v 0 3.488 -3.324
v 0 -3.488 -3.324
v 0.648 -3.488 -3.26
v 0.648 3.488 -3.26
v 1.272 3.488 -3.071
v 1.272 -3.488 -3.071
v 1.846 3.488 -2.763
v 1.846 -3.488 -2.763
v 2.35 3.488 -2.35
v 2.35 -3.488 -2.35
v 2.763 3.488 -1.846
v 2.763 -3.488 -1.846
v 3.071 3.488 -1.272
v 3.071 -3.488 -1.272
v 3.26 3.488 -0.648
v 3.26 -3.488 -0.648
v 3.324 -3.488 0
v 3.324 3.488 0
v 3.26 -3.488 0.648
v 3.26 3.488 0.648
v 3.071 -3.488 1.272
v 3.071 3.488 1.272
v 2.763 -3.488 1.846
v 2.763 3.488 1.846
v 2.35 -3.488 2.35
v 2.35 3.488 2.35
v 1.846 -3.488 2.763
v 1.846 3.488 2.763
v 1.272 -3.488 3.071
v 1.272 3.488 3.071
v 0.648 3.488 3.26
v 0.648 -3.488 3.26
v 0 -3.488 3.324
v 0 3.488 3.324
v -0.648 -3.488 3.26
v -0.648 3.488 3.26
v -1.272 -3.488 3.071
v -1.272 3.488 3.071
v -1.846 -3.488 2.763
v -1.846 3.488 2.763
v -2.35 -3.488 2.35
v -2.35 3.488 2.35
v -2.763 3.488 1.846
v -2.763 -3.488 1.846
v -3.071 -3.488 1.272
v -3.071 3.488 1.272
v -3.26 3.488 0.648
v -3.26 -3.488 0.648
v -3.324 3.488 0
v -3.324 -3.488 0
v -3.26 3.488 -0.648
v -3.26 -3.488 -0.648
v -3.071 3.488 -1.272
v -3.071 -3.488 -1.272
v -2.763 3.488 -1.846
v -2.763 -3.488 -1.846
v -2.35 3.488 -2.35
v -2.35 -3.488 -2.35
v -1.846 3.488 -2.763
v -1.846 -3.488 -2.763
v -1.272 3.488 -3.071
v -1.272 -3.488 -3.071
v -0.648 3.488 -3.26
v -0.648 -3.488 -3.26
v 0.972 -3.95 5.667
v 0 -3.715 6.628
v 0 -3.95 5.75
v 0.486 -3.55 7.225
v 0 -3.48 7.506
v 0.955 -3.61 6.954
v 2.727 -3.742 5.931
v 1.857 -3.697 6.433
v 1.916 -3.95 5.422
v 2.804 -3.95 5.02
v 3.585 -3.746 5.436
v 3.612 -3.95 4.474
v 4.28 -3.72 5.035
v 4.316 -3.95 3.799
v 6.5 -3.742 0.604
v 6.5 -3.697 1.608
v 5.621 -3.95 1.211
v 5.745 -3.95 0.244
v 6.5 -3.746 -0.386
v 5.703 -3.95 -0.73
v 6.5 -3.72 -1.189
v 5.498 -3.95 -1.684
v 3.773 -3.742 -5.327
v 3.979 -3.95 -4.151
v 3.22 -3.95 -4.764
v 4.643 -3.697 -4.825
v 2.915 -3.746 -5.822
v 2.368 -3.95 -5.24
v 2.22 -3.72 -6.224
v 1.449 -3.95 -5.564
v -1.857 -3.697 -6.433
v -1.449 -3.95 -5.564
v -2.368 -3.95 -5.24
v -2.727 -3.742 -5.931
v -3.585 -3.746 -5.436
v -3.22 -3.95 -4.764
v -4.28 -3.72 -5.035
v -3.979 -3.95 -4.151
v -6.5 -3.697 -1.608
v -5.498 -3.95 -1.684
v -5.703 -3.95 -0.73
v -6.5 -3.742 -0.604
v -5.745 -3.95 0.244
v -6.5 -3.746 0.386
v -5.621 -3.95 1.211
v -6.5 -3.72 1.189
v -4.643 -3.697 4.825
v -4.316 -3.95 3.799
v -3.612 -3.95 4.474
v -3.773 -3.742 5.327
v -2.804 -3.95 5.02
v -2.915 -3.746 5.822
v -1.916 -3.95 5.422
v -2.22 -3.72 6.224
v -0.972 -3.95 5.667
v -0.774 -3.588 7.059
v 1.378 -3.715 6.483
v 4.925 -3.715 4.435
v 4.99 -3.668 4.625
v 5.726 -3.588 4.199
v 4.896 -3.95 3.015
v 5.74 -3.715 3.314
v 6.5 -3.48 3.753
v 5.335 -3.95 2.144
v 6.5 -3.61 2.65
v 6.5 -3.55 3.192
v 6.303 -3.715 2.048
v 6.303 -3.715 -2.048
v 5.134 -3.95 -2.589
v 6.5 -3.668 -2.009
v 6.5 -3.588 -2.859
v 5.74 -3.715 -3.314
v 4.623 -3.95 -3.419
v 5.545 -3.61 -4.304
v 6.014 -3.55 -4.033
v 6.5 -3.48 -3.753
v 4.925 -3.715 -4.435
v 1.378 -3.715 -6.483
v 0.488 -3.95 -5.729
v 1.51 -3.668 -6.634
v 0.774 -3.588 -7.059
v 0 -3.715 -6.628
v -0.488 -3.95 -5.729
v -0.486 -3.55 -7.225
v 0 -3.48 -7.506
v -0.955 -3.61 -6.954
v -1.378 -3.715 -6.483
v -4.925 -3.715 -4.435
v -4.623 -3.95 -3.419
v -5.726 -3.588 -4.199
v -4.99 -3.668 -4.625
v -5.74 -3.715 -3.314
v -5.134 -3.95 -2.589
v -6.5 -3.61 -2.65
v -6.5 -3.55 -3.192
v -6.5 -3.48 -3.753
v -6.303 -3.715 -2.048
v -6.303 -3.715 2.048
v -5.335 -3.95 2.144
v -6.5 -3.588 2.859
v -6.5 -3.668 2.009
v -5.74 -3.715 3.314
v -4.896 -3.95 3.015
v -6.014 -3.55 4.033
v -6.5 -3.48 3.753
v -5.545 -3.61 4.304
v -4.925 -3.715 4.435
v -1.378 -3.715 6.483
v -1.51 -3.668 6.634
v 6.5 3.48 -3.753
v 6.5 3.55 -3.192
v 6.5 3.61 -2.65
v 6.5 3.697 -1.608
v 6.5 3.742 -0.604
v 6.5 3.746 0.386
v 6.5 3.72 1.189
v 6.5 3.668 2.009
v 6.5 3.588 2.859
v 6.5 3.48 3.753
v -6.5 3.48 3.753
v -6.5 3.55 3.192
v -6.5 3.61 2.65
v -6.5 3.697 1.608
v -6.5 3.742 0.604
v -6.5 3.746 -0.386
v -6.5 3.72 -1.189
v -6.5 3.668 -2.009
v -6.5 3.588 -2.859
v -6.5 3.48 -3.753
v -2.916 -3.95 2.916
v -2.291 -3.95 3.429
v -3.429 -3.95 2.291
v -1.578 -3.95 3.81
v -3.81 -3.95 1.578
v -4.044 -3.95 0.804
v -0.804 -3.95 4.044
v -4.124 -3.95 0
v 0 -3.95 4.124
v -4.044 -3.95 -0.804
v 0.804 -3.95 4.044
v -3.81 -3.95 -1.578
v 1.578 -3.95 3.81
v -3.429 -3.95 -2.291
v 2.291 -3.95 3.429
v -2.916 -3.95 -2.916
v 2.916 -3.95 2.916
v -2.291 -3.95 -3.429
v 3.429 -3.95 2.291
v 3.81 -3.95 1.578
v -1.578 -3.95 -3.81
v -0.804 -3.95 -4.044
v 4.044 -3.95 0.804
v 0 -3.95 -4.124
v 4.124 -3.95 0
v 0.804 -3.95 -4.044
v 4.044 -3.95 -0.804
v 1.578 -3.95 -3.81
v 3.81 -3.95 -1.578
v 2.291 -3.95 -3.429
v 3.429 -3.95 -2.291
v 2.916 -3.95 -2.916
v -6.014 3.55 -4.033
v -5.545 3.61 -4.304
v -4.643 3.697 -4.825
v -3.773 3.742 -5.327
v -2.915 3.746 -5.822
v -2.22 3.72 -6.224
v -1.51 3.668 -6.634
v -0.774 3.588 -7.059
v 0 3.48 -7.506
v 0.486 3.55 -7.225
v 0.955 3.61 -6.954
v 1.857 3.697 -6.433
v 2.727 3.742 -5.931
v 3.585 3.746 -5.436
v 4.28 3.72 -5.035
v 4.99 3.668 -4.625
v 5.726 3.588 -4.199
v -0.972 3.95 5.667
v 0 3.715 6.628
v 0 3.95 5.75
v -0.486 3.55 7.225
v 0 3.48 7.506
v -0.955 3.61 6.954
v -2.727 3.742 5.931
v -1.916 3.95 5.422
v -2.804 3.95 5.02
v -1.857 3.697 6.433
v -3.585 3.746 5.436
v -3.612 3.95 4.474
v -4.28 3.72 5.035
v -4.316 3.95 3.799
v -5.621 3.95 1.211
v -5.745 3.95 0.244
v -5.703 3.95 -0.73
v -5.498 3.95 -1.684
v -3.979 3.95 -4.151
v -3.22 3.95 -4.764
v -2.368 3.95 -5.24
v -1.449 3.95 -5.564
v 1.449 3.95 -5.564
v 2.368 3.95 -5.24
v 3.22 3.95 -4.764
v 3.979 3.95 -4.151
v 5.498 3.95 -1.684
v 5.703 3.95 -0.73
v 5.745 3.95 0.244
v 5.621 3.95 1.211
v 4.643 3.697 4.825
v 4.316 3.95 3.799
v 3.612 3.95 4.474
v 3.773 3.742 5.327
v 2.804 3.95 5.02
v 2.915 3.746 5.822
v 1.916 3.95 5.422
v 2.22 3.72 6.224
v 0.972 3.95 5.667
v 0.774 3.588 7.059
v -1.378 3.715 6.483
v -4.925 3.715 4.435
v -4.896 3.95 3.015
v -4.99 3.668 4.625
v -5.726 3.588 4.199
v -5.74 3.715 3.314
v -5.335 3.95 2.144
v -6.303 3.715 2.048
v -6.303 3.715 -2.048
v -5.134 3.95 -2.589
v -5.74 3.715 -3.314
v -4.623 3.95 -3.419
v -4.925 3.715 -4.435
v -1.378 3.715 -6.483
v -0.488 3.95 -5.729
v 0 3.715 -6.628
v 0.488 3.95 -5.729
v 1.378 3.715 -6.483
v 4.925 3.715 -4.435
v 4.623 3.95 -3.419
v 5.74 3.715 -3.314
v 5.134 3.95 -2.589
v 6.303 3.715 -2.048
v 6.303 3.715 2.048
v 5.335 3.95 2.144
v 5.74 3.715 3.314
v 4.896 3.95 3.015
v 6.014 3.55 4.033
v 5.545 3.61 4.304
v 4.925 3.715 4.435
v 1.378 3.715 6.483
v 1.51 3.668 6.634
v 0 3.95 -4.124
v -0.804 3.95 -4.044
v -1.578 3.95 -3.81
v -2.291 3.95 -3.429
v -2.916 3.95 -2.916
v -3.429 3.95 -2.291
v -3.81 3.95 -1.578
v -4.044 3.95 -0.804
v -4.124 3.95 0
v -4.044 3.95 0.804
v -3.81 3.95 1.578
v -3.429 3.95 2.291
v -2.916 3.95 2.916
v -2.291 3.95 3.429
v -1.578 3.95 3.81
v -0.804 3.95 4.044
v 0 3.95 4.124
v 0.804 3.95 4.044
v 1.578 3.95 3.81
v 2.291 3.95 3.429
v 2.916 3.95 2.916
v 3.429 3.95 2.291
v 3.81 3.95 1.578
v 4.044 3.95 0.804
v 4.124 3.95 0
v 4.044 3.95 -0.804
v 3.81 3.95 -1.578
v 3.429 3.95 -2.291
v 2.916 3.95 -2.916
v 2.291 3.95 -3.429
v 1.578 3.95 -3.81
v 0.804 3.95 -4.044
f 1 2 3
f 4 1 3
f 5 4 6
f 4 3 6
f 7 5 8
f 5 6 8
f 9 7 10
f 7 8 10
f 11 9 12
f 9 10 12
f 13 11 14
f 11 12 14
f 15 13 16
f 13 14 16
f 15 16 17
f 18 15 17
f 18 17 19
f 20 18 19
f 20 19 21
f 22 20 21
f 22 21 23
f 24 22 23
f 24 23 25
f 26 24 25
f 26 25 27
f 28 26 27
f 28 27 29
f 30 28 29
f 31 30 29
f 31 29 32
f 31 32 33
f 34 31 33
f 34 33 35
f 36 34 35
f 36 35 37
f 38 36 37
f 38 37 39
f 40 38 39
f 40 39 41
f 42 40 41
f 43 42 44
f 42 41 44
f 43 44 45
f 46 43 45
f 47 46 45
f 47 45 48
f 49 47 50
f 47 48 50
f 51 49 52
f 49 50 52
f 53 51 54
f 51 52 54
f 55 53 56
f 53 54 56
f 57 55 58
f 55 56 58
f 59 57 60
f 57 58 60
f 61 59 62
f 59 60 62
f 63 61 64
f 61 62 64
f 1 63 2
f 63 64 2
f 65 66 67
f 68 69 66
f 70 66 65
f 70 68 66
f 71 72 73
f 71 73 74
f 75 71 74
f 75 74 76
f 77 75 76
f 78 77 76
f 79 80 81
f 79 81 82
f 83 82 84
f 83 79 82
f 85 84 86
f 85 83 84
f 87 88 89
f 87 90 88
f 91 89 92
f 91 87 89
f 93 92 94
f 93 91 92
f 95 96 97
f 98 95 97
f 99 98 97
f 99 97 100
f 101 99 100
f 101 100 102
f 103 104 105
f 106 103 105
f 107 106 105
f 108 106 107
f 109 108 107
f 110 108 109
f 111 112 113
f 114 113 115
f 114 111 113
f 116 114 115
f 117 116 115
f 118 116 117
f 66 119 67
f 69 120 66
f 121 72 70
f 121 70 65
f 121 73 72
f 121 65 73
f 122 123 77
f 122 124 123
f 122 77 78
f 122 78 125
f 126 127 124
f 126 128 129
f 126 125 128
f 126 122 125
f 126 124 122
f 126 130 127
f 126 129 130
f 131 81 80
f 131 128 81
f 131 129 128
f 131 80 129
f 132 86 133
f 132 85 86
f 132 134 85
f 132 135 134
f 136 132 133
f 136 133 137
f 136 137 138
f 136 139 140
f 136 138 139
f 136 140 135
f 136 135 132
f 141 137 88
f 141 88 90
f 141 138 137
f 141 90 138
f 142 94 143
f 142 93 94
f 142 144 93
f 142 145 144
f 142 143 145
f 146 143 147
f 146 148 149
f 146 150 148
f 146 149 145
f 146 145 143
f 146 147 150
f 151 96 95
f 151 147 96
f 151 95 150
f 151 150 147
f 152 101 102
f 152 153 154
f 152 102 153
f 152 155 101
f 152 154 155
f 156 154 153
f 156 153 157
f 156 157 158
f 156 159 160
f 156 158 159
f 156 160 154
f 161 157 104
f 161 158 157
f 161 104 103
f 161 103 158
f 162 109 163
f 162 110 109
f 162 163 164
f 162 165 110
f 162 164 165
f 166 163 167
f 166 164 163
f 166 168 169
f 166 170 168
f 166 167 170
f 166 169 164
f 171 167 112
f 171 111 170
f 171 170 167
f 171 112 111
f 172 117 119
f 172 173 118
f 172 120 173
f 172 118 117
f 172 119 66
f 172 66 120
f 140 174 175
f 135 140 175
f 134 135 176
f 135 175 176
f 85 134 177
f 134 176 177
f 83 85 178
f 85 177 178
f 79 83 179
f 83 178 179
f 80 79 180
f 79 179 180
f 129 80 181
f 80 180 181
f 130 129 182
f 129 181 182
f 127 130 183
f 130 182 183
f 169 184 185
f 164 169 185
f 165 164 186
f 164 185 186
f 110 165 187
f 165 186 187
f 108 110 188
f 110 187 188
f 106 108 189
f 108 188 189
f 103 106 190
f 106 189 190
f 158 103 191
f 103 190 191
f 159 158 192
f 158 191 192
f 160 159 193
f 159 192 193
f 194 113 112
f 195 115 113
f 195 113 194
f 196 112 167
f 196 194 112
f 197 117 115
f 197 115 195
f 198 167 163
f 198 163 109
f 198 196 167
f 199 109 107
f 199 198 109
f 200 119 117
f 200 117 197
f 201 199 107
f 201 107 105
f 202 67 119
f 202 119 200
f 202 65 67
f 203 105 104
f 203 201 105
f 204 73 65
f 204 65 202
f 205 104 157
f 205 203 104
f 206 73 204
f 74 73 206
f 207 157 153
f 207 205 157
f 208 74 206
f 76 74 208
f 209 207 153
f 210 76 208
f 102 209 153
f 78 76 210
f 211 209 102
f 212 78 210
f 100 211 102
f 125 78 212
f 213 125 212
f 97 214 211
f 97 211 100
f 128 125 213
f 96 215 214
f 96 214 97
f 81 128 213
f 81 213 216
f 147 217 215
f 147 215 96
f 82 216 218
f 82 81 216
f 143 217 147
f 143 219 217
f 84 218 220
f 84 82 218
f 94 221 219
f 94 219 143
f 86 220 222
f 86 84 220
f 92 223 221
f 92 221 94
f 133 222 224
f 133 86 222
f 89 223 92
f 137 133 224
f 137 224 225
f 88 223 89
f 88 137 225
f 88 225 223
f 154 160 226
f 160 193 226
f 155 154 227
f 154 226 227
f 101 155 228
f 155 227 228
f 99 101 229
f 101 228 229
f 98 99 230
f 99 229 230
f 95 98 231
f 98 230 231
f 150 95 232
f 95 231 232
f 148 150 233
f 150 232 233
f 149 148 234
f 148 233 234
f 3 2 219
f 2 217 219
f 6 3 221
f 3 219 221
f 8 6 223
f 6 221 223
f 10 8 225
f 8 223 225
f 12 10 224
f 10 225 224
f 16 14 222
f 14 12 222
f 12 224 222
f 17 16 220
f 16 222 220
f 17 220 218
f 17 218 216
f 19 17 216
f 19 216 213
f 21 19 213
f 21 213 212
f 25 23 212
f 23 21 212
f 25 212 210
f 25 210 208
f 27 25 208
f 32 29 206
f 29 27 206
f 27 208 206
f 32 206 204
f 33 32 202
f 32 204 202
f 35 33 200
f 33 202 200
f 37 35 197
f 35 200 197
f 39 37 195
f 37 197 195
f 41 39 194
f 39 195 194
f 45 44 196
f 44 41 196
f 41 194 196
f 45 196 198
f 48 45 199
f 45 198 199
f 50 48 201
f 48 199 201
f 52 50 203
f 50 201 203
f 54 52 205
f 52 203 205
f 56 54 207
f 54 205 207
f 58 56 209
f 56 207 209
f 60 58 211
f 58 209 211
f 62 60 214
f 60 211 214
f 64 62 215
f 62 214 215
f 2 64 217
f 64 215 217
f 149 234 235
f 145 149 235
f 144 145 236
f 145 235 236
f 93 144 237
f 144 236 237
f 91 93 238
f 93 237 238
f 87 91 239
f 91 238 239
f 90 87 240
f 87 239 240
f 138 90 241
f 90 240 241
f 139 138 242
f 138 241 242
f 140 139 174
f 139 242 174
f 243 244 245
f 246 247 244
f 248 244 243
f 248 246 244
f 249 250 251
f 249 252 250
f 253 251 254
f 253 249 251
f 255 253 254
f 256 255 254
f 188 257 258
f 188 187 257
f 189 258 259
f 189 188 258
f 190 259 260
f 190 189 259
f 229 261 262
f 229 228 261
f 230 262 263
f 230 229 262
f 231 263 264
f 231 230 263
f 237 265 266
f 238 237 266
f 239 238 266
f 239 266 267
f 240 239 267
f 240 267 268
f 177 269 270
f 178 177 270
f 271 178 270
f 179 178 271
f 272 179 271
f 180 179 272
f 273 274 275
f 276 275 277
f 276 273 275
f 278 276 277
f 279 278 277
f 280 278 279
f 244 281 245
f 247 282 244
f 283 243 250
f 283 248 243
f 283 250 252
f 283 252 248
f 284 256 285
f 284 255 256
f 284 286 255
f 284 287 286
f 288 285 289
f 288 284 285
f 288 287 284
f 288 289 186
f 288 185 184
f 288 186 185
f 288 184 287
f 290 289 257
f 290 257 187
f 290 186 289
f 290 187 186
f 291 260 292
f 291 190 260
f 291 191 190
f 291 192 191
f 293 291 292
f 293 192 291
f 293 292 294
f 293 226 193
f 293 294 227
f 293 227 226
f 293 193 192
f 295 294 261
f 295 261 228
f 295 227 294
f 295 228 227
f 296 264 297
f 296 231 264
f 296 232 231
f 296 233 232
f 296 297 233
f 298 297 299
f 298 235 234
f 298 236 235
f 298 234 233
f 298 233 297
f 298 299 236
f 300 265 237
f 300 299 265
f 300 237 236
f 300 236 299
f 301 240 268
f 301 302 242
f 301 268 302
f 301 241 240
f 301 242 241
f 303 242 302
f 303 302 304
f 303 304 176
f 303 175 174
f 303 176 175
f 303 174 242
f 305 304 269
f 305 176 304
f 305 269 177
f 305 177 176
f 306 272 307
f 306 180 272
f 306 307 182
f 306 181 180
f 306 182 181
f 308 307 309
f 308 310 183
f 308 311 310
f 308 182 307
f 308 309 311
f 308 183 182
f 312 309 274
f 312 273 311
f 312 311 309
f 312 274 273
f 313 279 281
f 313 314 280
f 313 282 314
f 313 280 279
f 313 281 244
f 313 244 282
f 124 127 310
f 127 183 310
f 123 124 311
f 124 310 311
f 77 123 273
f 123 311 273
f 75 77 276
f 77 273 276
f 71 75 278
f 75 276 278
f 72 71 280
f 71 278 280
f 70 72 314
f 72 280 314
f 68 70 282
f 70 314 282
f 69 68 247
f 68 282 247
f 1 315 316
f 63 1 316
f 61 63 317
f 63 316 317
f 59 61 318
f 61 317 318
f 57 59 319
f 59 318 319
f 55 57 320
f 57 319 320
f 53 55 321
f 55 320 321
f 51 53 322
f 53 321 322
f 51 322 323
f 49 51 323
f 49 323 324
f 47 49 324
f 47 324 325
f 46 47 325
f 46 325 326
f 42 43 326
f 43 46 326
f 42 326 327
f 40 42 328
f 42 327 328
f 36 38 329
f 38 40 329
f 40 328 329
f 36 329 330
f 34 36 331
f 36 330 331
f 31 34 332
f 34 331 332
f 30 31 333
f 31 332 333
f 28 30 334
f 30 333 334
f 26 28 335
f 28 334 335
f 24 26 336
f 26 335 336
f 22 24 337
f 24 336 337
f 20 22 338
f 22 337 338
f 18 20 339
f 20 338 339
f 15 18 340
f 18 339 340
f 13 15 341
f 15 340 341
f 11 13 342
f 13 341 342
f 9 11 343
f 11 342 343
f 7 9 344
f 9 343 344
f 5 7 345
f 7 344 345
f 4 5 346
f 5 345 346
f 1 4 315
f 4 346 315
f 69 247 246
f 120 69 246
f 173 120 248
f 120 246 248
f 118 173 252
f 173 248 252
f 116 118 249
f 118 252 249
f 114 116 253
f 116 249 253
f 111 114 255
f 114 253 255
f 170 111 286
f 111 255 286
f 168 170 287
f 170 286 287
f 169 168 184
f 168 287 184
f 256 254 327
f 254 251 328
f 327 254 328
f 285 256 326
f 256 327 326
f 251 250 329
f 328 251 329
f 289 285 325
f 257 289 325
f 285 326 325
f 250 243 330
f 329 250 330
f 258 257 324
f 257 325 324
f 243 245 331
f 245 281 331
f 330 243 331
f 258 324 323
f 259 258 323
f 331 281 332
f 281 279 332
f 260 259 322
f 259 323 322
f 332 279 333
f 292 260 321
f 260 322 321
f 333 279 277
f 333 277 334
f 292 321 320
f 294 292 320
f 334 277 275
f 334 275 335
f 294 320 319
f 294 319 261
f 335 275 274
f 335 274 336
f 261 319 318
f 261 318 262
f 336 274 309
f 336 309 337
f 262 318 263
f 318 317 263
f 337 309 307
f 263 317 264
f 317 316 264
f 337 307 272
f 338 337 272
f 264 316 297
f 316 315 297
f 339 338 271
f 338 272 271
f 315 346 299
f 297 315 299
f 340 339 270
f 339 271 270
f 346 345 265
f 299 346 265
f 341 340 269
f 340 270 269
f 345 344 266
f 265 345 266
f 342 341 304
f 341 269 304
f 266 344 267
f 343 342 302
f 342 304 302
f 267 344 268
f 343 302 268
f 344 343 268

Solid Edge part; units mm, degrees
sketch "Sketch1" plane through (0, 0, 0) normal (0, -1, 0) x (1, 0, 0)
  line L0 (6.5, 3.7528) -> (0, 7.5056)
  line L1 (0, 7.5056) -> (-6.5, 3.7528)
  line L2 (-6.5, 3.7528) -> (-6.5, -3.7528)
  line L3 (-6.5, -3.7528) -> (0, -7.5056)
  line L4 (0, -7.5056) -> (6.5, -3.7528)
  line L5 (6.5, -3.7528) -> (6.5, 3.7528)
extrude "Protrusion1" add sketch "Sketch1" along normal mid plane 7.9
sketch "Sketch2" plane through (0, 0, 0) normal (1, 0, 0) x (0, 1, 0)
  line L0 (-3.95, 5.75) -> (-3.4796, 7.5056)
revolve "RevolvedCutout1" cut sketch "Sketch2" angle 360 about axis through (0, 0, 0) along (0, -1, 0) material side at (0, -3.7631, 6.6407)
mirror "Mirror1" about plane through (0, 0, 0) normal (0, -1, 0) of "RevolvedCutout1"
hole "孔_7" at (0, -3.95, 0) direction (0, 1, 0) diameter 6.647 end up to next start chamfer 0.8 start chamfer angle 60 end chamfer 0.8 end chamfer angle 60
properties part number "N2611-0312" material "铝 1060"
